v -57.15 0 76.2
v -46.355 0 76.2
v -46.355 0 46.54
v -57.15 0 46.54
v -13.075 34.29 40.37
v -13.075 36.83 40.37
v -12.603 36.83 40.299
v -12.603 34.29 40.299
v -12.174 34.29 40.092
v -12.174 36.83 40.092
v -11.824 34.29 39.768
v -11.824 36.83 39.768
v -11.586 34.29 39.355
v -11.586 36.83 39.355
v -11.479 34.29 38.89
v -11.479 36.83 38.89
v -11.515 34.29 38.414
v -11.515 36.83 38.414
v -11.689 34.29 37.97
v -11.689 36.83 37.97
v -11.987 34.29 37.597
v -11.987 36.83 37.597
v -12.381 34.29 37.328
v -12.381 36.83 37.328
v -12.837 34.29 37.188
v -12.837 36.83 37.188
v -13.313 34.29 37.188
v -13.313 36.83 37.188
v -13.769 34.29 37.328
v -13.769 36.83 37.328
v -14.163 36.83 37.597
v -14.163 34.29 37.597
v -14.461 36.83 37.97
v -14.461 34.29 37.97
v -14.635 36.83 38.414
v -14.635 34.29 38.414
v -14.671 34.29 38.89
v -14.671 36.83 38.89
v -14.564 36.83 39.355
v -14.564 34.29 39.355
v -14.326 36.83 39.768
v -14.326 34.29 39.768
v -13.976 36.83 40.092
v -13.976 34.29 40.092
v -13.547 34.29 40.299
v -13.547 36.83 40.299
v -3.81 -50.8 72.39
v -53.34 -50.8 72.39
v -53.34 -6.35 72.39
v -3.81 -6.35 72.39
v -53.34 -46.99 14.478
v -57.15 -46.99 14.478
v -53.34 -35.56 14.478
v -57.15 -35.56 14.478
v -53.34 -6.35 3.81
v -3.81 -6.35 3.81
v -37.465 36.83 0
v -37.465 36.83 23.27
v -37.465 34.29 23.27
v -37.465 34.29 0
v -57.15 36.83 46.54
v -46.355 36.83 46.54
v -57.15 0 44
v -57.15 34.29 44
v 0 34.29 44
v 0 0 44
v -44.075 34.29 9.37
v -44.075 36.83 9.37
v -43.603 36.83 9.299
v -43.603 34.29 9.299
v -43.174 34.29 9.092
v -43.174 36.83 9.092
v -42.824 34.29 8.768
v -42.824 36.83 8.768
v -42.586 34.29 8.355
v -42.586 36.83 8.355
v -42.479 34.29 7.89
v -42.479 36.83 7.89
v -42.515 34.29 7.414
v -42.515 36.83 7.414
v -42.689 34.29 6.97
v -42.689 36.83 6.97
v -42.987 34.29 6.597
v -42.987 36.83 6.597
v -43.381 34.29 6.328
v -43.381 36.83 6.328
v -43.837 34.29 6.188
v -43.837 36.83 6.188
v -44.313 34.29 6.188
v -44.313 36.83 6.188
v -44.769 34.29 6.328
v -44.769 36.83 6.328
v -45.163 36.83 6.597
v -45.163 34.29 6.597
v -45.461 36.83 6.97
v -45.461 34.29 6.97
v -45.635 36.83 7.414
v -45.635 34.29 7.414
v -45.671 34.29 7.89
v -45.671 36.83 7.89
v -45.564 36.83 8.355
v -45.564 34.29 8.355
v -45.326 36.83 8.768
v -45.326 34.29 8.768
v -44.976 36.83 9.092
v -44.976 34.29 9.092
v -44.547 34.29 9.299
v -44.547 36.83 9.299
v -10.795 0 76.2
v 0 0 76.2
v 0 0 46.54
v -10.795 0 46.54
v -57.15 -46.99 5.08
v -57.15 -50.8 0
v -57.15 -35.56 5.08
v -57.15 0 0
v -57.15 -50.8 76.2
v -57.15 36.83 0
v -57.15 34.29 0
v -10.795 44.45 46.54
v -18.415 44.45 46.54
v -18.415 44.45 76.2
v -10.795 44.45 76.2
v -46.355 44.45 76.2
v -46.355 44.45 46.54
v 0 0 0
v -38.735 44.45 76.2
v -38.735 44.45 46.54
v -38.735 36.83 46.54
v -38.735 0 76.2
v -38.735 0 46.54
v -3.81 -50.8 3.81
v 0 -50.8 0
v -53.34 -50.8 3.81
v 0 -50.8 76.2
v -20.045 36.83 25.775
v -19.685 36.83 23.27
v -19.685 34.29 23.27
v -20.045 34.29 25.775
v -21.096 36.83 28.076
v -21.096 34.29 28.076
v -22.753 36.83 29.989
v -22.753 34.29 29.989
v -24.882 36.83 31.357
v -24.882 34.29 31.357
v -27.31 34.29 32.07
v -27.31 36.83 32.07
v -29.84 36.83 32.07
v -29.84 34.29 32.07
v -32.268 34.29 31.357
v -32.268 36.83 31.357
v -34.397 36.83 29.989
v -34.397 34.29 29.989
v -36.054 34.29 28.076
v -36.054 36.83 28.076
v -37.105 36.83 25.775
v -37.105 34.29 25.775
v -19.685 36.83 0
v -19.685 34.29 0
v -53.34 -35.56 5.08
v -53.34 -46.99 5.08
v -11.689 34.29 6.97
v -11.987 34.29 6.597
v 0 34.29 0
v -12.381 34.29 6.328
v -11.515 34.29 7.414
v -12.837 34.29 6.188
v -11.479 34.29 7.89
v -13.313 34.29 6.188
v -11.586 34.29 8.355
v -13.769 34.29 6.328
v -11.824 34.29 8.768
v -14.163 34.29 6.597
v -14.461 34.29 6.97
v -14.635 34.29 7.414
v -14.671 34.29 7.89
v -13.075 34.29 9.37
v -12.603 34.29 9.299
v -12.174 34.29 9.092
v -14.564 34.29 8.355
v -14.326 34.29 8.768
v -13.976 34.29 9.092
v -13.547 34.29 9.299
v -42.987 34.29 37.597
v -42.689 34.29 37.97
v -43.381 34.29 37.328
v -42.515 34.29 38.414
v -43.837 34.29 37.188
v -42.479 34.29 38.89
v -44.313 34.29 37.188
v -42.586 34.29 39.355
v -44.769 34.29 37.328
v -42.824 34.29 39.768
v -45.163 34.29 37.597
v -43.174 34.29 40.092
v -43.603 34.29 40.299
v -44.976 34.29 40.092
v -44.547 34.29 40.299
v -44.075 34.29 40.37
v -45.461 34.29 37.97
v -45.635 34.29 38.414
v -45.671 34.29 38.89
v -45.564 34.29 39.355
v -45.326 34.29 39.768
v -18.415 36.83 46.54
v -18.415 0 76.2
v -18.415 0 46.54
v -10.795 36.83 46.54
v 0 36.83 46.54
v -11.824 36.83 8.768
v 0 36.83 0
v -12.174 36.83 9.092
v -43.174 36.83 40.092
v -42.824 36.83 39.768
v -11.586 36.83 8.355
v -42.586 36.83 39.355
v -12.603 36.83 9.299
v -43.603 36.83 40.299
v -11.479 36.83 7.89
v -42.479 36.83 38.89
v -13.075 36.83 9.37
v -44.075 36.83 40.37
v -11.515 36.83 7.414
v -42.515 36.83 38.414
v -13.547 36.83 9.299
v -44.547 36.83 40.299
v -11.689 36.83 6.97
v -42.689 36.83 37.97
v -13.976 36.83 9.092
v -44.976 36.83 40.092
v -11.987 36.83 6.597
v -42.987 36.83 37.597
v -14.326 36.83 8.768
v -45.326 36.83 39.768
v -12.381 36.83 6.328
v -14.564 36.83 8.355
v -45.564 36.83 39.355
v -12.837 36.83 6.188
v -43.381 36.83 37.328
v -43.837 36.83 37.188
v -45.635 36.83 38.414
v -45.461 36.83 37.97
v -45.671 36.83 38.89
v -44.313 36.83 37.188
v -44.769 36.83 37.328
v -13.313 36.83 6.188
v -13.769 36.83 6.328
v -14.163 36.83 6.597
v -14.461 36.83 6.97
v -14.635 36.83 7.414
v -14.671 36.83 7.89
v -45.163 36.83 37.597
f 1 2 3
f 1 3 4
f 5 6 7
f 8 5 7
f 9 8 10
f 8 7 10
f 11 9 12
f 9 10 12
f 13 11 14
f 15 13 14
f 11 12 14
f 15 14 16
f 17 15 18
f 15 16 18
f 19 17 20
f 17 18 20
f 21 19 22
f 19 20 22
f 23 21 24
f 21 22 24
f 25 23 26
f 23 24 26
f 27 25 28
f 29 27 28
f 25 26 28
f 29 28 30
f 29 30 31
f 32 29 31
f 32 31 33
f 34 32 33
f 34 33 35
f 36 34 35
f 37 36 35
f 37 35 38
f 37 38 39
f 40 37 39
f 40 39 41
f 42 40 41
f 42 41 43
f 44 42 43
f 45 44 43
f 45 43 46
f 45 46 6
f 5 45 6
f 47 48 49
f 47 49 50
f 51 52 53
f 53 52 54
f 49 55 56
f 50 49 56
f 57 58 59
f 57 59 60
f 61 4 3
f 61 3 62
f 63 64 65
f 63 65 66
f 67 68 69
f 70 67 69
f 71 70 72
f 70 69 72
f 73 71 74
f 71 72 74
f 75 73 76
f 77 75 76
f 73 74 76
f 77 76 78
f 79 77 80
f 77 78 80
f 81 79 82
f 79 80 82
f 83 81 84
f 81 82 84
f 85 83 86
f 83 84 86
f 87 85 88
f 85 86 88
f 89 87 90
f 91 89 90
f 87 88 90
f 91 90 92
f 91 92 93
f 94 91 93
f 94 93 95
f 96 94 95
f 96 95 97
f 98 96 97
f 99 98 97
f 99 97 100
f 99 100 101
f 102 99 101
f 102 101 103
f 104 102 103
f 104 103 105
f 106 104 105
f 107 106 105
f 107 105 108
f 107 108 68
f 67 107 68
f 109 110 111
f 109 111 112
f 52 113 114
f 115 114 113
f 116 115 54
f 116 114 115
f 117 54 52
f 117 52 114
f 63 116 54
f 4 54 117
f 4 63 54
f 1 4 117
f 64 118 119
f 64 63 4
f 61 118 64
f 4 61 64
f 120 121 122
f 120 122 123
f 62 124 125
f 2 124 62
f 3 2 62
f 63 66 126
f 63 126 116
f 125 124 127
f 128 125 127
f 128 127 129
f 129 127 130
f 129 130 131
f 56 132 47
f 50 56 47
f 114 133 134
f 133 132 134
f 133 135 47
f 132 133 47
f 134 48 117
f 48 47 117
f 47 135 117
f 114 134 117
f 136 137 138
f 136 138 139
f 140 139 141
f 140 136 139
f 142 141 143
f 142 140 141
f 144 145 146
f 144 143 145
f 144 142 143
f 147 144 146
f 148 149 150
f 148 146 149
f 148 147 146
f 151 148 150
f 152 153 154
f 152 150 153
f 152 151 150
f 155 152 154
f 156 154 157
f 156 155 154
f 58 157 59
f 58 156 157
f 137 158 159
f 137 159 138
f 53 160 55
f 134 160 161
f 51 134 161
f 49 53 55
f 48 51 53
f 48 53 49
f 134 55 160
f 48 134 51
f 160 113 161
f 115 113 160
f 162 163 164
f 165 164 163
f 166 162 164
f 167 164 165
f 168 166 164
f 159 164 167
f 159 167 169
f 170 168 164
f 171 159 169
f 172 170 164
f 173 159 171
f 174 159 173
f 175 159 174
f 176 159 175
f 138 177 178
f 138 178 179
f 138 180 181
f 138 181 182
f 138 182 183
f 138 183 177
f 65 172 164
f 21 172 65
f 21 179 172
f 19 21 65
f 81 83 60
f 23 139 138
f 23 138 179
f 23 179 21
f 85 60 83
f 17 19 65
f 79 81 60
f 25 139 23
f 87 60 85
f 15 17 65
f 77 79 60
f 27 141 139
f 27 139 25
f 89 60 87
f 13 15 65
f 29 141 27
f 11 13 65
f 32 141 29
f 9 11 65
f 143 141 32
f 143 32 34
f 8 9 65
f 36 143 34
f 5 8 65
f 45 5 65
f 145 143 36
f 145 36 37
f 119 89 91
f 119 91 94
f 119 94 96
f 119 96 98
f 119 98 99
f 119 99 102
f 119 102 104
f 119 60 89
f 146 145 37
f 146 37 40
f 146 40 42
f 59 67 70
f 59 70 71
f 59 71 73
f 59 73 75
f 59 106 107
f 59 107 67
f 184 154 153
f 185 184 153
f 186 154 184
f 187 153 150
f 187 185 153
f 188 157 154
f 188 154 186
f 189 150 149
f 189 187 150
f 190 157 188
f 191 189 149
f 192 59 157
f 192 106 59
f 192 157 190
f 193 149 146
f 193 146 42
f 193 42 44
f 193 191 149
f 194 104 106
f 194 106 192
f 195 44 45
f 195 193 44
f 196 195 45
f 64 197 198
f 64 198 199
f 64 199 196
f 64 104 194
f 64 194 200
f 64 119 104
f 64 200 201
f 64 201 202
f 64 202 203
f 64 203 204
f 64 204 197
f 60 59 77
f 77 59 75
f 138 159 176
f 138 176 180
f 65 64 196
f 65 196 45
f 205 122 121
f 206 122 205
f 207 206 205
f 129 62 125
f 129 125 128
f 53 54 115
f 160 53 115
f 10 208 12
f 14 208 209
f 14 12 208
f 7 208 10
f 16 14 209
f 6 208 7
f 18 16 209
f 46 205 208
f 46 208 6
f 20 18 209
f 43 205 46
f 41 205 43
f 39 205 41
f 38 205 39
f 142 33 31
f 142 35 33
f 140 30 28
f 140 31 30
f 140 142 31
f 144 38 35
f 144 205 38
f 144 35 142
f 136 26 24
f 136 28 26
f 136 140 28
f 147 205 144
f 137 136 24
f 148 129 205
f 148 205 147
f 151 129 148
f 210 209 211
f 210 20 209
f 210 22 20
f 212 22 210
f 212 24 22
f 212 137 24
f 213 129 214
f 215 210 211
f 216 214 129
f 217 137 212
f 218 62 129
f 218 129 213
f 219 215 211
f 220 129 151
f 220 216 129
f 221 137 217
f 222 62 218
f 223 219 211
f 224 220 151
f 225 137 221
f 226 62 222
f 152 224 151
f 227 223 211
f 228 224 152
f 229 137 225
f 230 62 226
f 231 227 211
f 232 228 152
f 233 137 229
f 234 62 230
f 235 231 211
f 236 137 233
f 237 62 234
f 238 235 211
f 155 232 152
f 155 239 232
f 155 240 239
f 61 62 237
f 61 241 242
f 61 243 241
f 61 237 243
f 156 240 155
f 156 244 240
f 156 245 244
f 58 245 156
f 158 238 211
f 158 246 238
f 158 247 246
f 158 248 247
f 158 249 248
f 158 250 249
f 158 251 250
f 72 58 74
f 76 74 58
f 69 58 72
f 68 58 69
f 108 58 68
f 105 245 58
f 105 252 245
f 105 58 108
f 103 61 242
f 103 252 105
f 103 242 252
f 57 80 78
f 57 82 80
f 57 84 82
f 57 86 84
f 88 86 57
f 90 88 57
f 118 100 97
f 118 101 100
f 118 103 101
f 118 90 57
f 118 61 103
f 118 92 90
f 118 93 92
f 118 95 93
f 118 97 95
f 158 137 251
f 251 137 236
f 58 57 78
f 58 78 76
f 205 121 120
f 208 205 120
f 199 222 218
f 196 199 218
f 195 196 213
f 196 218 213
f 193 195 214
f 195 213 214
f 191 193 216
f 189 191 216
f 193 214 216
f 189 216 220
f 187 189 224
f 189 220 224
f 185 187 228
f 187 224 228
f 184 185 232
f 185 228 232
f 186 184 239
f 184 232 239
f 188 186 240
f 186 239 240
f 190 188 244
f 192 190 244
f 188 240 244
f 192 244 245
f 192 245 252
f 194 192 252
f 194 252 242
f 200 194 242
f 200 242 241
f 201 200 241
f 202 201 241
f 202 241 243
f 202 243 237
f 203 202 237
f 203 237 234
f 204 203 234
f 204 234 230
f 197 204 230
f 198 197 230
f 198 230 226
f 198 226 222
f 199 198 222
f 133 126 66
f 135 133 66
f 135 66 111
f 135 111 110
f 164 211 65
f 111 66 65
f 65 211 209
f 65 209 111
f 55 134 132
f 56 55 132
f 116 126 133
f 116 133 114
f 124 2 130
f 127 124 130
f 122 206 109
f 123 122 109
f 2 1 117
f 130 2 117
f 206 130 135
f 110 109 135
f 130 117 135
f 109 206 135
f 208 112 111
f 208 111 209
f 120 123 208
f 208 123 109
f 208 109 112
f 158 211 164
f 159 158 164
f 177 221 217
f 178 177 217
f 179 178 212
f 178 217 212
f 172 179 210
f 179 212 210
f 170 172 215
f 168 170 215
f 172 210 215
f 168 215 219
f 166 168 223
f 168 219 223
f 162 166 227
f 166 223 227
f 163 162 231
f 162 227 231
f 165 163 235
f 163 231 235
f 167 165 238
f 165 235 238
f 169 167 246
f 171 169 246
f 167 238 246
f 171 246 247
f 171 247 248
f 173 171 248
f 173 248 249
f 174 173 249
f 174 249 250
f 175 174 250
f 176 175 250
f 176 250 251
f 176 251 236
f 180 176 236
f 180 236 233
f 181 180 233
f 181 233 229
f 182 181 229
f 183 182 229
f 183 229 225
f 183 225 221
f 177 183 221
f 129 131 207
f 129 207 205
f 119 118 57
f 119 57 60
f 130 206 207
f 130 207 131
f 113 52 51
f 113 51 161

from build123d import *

# Parameters (mm, degrees)
SKETCH3_W                         = 57.15
SKETCH3_H                         = 76.2
BOSS_EXTRUDE2_DEPTH               = 50.8
SKETCH4_W                         = 49.53
SKETCH4_H                         = 68.58
CUT_EXTRUDE2_DEPTH                = 44.45
CUT_EXTRUDE3_REACH                = 109.95
SKETCH5_W                         = 9.398
SKETCH5_H                         = 11.43
MOTOR_MOUNTING_SHAPE_DEPTH        = 57.15
MOTOR_MOUNTING_HOLES_REACH        = 131.428
SKETCH8_R                         = 1.6
SKETCH7_W                         = 7.62
SKETCH7_H                         = 29.66
TRAY_SUPPORT_MOUNTING_SHAPE_DEPTH = 44.45


with BuildPart() as part:
    # Sketch3 → Boss-Extrude2 (new body)
    with BuildSketch(Plane(origin=(0, 0, 0), x_dir=(-1, 0, 0), z_dir=(0, 1, 0))):
        with Locations((28.575, 38.1)):
            Rectangle(SKETCH3_W, SKETCH3_H)
    extrude(amount=-BOSS_EXTRUDE2_DEPTH)

    # Sketch4 → Cut-Extrude2 (cut)
    with BuildSketch(Plane.XZ.offset(50.8)):
        with Locations((-28.575, 38.1)):
            Rectangle(SKETCH4_W, SKETCH4_H)
    extrude(amount=-CUT_EXTRUDE2_DEPTH, mode=Mode.SUBTRACT)

    # Sketch5 → Cut-Extrude3 (cut, up to next)
    with BuildSketch(Plane(origin=(-57.15, 0, 0), x_dir=(0, 0, -1), z_dir=(1, 0, 0)), mode=Mode.PRIVATE) as cut_extrude3_sk1:
        with Locations((-9.779, -41.275)):
            Rectangle(SKETCH5_W, SKETCH5_H)
    cut_extrude3_tool1 = extrude(cut_extrude3_sk1.sketch, amount=CUT_EXTRUDE3_REACH, mode=Mode.PRIVATE) & part.part
    add(cut_extrude3_tool1.solids().sort_by_distance((-57.15, -41.275, 9.779))[0], mode=Mode.SUBTRACT)

    # Sketch6 → Motor Mounting Shape (add)
    with BuildSketch(Plane.ZY.offset(57.15)):
        Polygon((46.54, 0), (46.54, 36.83), (0, 36.83), (0, 34.29), (44, 34.29), (44, 0), align=None)
    extrude(amount=-MOTOR_MOUNTING_SHAPE_DEPTH)

    # Sketch8 → Motor-Mounting-Holes (cut, up to next)
    with BuildSketch(Plane(origin=(0, 36.83, 0), x_dir=(1, 0, 0), z_dir=(0, 1, 0)), mode=Mode.PRIVATE) as motor_mounting_holes_sk1:
        with Locations(Location((-44.075, -7.77, 0), (0, 0, 270))):
            Circle(SKETCH8_R)
    motor_mounting_holes_tool1 = extrude(motor_mounting_holes_sk1.sketch, amount=-MOTOR_MOUNTING_HOLES_REACH, mode=Mode.PRIVATE) & part.part
    # Sketch8 → Motor-Mounting-Holes (cut, up to next)
    with BuildSketch(Plane(origin=(0, 36.83, 0), x_dir=(1, 0, 0), z_dir=(0, 1, 0)), mode=Mode.PRIVATE) as motor_mounting_holes_sk2:
        with Locations(Location((-13.075, -7.77, 0), (0, 0, 270))):
            Circle(SKETCH8_R)
    motor_mounting_holes_tool2 = extrude(motor_mounting_holes_sk2.sketch, amount=-MOTOR_MOUNTING_HOLES_REACH, mode=Mode.PRIVATE) & part.part
    # Sketch8 → Motor-Mounting-Holes (cut, up to next)
    with BuildSketch(Plane(origin=(0, 36.83, 0), x_dir=(1, 0, 0), z_dir=(0, 1, 0)), mode=Mode.PRIVATE) as motor_mounting_holes_sk3:
        with Locations(Location((-13.075, -38.77, 0), (0, 0, 270))):
            Circle(SKETCH8_R)
    motor_mounting_holes_tool3 = extrude(motor_mounting_holes_sk3.sketch, amount=-MOTOR_MOUNTING_HOLES_REACH, mode=Mode.PRIVATE) & part.part
    # Sketch8 → Motor-Mounting-Holes (cut, up to next)
    with BuildSketch(Plane(origin=(0, 36.83, 0), x_dir=(1, 0, 0), z_dir=(0, 1, 0)), mode=Mode.PRIVATE) as motor_mounting_holes_sk4:
        with Locations(Location((-44.075, -38.77, 0), (0, 0, 270))):
            Circle(SKETCH8_R)
    motor_mounting_holes_tool4 = extrude(motor_mounting_holes_sk4.sketch, amount=-MOTOR_MOUNTING_HOLES_REACH, mode=Mode.PRIVATE) & part.part
    # Sketch8 → Motor-Mounting-Holes (cut, up to next)
    with BuildSketch(Plane(origin=(0, 36.83, 0), x_dir=(1, 0, 0), z_dir=(0, 1, 0)), mode=Mode.PRIVATE) as motor_mounting_holes_sk5:
        with BuildLine():
            Line((-37.465, 0), (-19.685, 0))
            Line((-19.685, 0), (-19.685, -23.27))
            ThreePointArc((-19.685, -23.27), (-28.575, -32.16), (-37.465, -23.27))
            Line((-37.465, -23.27), (-37.465, 0))
        make_face()
    motor_mounting_holes_tool5 = extrude(motor_mounting_holes_sk5.sketch, amount=-MOTOR_MOUNTING_HOLES_REACH, mode=Mode.PRIVATE) & part.part
    add(motor_mounting_holes_tool1.solids().sort_by_distance((-44.075, 36.83, 7.77))[0], mode=Mode.SUBTRACT)
    add(motor_mounting_holes_tool2.solids().sort_by_distance((-13.075, 36.83, 7.77))[0], mode=Mode.SUBTRACT)
    add(motor_mounting_holes_tool3.solids().sort_by_distance((-13.075, 36.83, 38.77))[0], mode=Mode.SUBTRACT)
    add(motor_mounting_holes_tool4.solids().sort_by_distance((-44.075, 36.83, 38.77))[0], mode=Mode.SUBTRACT)
    add(motor_mounting_holes_tool5.solids().sort_by_distance((-28.575, 36.83, 15.191166))[0], mode=Mode.SUBTRACT)

    # Sketch7 → Tray Support Mounting Shape (add)
    with BuildSketch(Plane(origin=(0, 0, 0), x_dir=(1, 0, 0), z_dir=(0, 1, 0))):
        with Locations((-42.545, -61.37)):
            Rectangle(SKETCH7_W, SKETCH7_H)
        with Locations((-14.605, -61.37)):
            Rectangle(SKETCH7_W, SKETCH7_H)
    extrude(amount=TRAY_SUPPORT_MOUNTING_SHAPE_DEPTH)


solid = part.part
